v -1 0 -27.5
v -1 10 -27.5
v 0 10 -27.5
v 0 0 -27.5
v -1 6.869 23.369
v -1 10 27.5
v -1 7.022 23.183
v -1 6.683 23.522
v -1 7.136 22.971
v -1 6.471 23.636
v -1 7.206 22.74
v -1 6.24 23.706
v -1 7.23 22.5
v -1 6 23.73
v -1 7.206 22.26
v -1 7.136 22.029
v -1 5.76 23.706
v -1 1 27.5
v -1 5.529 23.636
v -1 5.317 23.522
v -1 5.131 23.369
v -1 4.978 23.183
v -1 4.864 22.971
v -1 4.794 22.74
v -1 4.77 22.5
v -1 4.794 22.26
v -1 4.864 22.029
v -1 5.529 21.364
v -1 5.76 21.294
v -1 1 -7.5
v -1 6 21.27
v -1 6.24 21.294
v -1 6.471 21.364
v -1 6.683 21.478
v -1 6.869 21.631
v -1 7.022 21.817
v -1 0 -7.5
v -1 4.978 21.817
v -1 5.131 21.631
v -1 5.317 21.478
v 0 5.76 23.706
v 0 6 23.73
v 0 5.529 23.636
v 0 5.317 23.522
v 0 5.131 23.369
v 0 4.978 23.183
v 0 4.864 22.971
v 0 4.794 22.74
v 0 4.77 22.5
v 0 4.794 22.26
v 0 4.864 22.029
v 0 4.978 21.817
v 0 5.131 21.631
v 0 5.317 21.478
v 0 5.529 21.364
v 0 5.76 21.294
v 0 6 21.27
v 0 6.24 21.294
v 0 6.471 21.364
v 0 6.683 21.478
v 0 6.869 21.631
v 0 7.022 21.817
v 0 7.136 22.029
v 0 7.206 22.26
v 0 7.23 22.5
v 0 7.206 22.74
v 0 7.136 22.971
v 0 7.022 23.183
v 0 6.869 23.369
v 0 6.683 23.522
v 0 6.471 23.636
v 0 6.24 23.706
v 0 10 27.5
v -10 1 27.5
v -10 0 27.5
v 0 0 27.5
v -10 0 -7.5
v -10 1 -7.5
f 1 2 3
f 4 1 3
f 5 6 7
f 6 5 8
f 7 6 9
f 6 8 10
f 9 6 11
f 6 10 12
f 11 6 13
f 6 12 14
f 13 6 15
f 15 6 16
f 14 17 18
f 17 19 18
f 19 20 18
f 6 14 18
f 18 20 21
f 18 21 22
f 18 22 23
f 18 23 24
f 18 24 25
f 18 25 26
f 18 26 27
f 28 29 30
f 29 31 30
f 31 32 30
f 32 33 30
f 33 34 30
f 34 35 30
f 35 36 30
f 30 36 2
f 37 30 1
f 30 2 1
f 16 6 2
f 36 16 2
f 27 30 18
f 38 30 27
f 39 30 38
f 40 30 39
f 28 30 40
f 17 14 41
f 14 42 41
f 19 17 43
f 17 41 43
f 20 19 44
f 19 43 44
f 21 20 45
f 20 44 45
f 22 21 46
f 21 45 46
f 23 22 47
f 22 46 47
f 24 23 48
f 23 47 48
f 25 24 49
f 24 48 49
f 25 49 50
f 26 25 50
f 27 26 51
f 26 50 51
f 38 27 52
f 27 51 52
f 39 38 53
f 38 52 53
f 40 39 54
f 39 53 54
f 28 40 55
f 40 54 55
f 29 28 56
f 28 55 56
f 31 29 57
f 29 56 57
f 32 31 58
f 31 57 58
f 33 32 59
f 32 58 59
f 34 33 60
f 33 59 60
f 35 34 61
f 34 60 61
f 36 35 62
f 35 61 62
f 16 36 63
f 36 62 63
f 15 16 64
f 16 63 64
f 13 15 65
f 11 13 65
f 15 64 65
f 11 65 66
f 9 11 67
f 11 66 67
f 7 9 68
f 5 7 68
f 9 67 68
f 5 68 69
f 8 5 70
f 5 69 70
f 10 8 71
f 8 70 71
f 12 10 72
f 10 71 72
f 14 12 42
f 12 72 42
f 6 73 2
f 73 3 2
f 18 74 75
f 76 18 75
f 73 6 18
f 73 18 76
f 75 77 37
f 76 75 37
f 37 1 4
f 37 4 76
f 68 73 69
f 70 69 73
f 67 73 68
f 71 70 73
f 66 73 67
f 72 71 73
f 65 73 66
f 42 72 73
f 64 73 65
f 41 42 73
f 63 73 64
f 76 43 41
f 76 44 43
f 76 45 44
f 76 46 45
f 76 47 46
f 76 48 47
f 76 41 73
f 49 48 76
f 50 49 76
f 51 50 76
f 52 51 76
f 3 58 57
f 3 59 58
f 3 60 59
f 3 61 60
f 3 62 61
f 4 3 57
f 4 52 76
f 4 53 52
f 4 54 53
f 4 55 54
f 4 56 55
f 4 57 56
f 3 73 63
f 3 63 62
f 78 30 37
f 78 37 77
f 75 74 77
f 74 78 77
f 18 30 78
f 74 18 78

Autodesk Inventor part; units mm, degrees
ref_plane "YZ Plane" through (0, 0, 0) normal (1, 0, 0) x (0, 1, 0)
ref_plane "XZ Plane" through (0, 0, 0) normal (0, 1, 0) x (-1, 0, 0)
ref_plane "XY Plane" through (0, 0, 0) normal (0, 0, 1) x (1, 0, 0)
sketch "Náčrt1" plane through (0, 0, 0) normal (0, 0, 1) x (1, 0, 0)
  line L0 (-12, 0) -> (2, 0) projected
  line L1 (0, 12) -> (0, -2) projected
  line L2 (0, 0) -> (0, 10)
  line L3 (0, 10) -> (-1, 10)
  line L4 (-1, 10) -> (-1, 1)
  line L5 (-1, 1) -> (-10, 1)
  line L6 (-10, 1) -> (-10, 0)
  line L7 (-10, 0) -> (0, 0)
  dimension "d0" = 10
  dimension "d1" = 1
  dimension "d2" = 9
  dimension "d3" = 9
extrude "Vysunutí1" add sketch "Náčrt1" along normal mid plane 55
sketch "Náčrt2" plane through (-1, 1, 27.5) normal (-1, 0, 0) x (0, 0, 1)
  line L0 (-55, 0) -> (0, 0) projected
  line L1 (0, 9) -> (0, 0) projected
  line L2 (-55, 9) -> (0, 9) projected
  line L3 (-55, 0) -> (-55, 9) projected
  point P0 (-27.5, -1)
  point P1 (-5, 5)
  dimension "d6" = 5
  dimension "d7" = 5
hole "Díra1" at (-1, 6, 22.5) direction (1, 0, 0) diameter 2.459 end through all thread size "M3x0.5" class "6H" standard "ISO Metric profile"
sketch "Náčrt3" plane through (-10, 1, 27.5) normal (0, 1, 0) x (1, 0, 0)
  line L0 (0, 0) -> (0, 55) projected
  line L1 (9, 0) -> (0, 0) projected
  line L2 (9, 55) -> (9, 0) projected
  line L3 (0, 55) -> (9, 55) projected
  line L4 (0, 55) -> (9, 55)
  line L5 (9, 55) -> (9, 35)
  line L6 (9, 35) -> (0, 35)
  line L7 (0, 35) -> (0, 55)
  point P0 (10, 27.5)
  dimension "d15" = 20
extrude "Vysunutí2" cut sketch "Náčrt3" against normal through all contours L0 L3 L2 L6
properties part number "lift_tab" material "Hliník 6061"
